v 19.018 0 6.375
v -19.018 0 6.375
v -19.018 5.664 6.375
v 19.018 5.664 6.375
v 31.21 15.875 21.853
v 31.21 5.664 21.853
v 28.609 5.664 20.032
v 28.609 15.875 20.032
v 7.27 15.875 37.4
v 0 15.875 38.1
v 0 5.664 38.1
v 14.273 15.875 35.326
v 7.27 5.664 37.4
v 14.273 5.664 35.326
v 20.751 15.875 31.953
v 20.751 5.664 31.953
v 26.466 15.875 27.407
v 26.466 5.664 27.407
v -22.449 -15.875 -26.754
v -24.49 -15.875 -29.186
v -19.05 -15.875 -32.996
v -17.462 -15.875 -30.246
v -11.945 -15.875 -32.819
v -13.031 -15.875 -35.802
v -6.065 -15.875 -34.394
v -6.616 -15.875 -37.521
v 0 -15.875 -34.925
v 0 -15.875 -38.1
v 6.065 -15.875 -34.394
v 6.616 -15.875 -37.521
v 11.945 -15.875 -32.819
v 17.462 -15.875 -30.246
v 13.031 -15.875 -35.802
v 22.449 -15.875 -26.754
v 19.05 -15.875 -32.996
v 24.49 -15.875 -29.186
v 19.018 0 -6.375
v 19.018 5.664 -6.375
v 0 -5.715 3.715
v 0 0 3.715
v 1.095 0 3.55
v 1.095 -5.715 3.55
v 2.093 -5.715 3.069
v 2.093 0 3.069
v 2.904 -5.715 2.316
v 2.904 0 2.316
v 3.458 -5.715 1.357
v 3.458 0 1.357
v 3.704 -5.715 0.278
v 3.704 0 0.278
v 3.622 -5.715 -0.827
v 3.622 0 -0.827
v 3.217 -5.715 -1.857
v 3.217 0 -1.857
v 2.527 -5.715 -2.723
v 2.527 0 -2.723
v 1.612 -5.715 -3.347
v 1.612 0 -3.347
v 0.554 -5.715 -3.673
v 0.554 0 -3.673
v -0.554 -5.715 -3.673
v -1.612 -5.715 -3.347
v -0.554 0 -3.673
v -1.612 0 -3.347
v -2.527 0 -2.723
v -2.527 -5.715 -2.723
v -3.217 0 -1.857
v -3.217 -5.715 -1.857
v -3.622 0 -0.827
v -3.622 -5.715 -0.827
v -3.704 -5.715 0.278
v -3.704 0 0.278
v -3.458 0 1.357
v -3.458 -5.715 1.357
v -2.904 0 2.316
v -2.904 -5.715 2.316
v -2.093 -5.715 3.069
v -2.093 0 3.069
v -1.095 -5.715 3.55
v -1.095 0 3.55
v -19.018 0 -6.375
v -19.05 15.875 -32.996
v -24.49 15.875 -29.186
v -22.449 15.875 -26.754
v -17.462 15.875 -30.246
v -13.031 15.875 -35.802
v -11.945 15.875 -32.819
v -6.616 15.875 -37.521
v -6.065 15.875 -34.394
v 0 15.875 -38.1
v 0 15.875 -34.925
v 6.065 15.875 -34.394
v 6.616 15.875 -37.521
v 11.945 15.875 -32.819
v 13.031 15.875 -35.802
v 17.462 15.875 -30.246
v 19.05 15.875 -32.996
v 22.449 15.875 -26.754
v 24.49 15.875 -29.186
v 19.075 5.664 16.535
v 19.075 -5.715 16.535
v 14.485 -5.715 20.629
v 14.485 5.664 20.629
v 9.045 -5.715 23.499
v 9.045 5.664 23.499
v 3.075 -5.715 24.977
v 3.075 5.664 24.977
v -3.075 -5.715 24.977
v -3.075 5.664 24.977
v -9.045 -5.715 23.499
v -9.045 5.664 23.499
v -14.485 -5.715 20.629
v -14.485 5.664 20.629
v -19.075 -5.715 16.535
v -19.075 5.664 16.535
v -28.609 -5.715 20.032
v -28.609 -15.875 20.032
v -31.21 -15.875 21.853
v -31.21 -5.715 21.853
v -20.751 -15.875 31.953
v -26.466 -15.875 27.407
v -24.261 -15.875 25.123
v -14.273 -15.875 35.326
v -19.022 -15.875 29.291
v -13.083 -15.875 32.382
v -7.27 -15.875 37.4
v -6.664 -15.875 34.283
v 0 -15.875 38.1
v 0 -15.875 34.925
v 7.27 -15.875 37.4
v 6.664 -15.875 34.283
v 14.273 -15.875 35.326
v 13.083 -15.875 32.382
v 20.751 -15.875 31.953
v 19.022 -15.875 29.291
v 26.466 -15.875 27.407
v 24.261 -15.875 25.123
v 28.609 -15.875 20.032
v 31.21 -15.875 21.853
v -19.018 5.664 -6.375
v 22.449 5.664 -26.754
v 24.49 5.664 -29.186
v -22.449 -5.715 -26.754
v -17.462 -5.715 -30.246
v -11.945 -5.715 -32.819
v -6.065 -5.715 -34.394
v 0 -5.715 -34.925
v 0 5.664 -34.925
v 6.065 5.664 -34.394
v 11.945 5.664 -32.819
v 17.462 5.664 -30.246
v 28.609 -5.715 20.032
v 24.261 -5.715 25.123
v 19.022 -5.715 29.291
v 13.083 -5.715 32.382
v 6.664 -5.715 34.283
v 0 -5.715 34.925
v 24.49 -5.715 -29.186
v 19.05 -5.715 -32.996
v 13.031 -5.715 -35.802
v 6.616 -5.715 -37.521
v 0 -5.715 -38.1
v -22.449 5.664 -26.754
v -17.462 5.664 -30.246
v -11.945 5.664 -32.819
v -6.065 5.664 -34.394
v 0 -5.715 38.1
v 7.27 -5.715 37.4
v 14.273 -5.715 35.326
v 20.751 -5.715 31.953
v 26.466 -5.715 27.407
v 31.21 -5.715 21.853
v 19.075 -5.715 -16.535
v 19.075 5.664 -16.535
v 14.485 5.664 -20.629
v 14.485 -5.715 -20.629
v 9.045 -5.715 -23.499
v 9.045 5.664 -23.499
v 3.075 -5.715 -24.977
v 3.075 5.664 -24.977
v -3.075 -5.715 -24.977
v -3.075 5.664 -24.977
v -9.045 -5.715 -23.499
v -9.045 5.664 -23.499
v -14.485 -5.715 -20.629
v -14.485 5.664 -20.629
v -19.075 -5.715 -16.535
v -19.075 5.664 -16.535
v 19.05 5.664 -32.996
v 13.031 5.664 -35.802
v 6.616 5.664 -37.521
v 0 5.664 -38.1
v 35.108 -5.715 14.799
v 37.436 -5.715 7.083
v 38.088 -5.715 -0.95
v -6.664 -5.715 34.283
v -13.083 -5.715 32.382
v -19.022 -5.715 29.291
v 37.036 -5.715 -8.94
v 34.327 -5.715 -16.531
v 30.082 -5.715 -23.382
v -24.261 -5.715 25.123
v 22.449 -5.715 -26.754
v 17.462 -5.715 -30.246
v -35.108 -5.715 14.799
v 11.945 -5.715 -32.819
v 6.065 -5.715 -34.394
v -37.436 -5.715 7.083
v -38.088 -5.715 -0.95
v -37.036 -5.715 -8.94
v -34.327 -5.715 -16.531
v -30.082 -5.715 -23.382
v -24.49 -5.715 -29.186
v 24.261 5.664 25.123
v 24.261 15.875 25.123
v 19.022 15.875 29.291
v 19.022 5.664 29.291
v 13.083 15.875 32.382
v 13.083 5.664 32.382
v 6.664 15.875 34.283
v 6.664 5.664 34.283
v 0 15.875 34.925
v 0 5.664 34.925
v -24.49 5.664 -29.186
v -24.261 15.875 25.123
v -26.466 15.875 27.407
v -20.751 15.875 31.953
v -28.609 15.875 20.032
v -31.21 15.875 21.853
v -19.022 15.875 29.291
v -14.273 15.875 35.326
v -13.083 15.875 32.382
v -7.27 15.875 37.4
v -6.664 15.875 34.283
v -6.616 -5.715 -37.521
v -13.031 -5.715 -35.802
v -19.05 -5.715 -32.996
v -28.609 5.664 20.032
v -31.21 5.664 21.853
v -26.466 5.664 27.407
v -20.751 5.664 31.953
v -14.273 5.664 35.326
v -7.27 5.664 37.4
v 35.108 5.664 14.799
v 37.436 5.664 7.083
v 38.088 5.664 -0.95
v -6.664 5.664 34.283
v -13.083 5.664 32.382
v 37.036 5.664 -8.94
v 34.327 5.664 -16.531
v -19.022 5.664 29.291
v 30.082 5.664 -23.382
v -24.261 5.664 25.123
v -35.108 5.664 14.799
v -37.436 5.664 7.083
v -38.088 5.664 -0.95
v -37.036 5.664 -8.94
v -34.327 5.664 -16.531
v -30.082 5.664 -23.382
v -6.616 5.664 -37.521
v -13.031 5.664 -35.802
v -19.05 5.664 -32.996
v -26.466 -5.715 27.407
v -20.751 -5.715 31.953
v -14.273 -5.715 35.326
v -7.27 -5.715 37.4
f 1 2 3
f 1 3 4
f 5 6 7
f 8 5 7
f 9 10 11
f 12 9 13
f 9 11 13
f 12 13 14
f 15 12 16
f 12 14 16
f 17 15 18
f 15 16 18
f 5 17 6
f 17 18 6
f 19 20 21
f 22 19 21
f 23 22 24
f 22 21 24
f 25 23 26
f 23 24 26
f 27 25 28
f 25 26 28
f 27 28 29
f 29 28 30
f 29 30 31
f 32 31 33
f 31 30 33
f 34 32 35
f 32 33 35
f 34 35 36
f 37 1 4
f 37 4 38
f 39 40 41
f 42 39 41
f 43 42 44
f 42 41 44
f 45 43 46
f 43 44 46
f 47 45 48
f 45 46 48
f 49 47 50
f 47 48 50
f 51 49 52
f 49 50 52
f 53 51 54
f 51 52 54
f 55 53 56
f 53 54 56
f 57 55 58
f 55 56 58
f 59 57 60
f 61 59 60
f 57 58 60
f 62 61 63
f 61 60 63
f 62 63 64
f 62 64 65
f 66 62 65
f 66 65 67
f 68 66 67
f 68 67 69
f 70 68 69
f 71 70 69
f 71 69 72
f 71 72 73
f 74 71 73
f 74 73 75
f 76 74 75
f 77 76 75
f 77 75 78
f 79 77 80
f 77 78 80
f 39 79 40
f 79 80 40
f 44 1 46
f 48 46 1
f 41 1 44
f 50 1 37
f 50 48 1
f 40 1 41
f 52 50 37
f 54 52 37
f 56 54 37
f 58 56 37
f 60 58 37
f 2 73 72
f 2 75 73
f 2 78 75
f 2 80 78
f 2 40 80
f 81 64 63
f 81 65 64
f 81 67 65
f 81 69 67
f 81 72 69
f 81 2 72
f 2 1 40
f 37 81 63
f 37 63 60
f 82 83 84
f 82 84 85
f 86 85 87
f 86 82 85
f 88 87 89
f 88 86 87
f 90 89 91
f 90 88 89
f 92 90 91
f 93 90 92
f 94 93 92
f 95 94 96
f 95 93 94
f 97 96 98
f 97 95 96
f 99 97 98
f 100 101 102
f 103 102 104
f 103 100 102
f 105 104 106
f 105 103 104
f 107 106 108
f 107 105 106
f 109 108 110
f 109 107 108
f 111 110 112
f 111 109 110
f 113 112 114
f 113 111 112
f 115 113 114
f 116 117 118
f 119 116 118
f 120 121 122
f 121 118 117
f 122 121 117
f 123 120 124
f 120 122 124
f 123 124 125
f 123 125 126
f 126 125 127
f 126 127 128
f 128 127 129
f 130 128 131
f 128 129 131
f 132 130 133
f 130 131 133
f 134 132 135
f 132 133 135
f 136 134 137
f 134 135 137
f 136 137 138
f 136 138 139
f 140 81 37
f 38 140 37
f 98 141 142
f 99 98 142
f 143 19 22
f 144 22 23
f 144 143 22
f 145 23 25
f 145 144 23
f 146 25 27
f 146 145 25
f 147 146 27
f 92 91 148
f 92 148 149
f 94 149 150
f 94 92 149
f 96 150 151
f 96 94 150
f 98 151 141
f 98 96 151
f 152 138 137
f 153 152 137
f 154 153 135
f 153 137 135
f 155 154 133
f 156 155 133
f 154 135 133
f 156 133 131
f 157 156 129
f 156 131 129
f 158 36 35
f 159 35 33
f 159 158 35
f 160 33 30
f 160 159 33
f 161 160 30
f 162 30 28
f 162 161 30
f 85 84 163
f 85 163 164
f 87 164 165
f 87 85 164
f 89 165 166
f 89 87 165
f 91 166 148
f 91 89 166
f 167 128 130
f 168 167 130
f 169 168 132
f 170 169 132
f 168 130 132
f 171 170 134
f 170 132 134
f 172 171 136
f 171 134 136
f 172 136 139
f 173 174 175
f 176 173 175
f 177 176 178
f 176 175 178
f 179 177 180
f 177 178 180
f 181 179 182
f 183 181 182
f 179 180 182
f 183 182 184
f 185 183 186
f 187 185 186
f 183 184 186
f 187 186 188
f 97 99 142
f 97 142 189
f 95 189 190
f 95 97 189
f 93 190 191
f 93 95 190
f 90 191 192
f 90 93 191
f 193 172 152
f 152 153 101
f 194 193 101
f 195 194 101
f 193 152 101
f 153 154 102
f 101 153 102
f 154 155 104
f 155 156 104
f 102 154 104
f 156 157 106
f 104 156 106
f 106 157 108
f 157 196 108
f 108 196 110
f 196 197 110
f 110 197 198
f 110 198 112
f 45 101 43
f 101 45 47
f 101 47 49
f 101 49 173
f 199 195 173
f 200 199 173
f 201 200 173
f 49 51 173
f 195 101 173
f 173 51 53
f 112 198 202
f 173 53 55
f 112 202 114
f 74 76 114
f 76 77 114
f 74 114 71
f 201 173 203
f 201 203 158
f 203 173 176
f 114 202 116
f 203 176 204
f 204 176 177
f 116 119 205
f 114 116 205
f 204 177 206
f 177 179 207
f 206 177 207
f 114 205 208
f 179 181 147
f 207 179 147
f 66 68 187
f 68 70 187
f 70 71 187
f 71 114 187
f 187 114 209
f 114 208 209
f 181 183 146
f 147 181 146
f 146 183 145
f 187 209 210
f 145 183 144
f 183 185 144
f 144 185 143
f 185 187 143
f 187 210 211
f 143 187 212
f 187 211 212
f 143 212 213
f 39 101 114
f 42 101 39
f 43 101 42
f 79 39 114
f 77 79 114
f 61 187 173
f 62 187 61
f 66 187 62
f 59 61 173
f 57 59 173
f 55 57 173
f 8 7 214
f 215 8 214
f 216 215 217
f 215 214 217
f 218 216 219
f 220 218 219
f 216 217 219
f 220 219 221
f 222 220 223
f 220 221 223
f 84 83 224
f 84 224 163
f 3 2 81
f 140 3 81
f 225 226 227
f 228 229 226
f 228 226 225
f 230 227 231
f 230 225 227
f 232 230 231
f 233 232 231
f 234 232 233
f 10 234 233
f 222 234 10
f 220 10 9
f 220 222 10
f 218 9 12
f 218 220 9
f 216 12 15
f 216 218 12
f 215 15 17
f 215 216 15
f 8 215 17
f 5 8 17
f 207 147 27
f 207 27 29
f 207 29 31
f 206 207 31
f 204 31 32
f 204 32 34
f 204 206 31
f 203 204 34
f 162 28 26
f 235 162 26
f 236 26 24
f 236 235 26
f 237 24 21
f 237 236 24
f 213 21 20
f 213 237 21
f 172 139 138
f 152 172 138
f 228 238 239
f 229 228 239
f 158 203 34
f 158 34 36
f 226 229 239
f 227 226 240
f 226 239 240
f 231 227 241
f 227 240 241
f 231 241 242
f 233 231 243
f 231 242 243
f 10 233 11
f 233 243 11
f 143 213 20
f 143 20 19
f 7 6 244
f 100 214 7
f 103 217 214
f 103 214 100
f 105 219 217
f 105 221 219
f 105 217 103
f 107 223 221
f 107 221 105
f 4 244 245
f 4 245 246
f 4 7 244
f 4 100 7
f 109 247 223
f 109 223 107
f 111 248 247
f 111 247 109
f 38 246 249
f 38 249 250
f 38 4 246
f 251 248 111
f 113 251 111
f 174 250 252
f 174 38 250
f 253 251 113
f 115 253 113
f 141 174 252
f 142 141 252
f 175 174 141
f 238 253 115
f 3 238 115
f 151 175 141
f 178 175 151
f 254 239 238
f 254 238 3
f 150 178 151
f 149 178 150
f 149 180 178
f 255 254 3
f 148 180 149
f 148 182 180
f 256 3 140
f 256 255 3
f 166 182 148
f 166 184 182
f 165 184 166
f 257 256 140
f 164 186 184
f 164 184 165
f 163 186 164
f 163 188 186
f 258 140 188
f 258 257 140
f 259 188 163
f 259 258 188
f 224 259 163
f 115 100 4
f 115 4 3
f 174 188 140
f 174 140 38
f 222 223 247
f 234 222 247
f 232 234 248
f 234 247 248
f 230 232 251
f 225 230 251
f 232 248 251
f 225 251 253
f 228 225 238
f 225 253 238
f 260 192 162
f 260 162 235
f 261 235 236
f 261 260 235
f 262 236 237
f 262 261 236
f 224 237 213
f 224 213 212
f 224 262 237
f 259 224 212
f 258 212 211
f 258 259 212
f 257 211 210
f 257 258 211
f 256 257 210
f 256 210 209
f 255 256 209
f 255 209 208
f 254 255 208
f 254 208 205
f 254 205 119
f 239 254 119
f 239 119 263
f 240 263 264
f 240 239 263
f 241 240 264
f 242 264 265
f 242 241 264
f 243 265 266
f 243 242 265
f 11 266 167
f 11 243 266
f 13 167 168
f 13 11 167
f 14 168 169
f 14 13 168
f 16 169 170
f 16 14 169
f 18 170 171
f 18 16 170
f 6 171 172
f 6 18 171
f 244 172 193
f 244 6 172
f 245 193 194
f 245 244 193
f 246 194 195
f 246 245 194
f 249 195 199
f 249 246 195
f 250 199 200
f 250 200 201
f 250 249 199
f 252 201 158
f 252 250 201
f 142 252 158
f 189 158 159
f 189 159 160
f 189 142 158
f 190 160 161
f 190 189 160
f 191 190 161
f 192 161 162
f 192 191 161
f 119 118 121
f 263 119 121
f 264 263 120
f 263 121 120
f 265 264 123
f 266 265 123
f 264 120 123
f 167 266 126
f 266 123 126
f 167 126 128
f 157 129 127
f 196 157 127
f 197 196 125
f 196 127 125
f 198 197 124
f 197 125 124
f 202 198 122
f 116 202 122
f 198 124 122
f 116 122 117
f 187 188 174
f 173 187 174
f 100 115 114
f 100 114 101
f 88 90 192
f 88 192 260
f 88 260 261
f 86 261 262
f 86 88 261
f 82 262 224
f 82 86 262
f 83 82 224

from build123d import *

# Parameters (mm, degrees)
SKETCH1_R           = 38.1
SKETCH1_W           = 38.0365
SKETCH1_H           = 12.7508
BOSS_EXTRUDE1_DEPTH = 5.6642
BOSS_EXTRUDE2_START = -5.715
SKETCH1_3_R         = 38.1
SKETCH1_3_R_2       = 3.71475
BOSS_EXTRUDE2_DEPTH = 5.715
BOSS_EXTRUDE3_DEPTH = 15.875
CUT_EXTRUDE2_DEPTH  = 59.02721


with BuildPart() as part:
    # Sketch1 → Boss-Extrude1 (new body)
    with BuildSketch(Plane(origin=(0, 0, 0), x_dir=(1, 0, 0), z_dir=(0, 1, 0))):
        Circle(SKETCH1_R)
        Rectangle(SKETCH1_W, SKETCH1_H, mode=Mode.SUBTRACT)
    extrude(amount=BOSS_EXTRUDE1_DEPTH)

    # Sketch1<3> → Boss-Extrude2 (add)
    with BuildSketch(Plane(origin=(0, 0, 0), x_dir=(1, 0, 0), z_dir=(0, 1, 0)).offset(BOSS_EXTRUDE2_START)):
        Circle(SKETCH1_3_R)
        Circle(SKETCH1_3_R_2, mode=Mode.SUBTRACT)
    extrude(amount=BOSS_EXTRUDE2_DEPTH)

    # Sketch2 → Boss-Extrude3 (add, symmetric)
    with BuildSketch(Plane(origin=(0, 0, 0), x_dir=(1, 0, 0), z_dir=(0, 1, 0))):
        with BuildLine():
            ThreePointArc((24.490208, 29.186293), (0, 38.1), (-24.490208, 29.186293))
            Line((-24.490208, 29.186293), (-22.449357, 26.754102))
            ThreePointArc((-22.449357, 26.754102), (0, 34.925), (22.449357, 26.754102))
            Line((22.449357, 26.754102), (24.490208, 29.186293))
        make_face()
        with BuildLine():
            ThreePointArc((28.608885, -20.032157), (0, -34.925), (-28.608885, -20.032157))
            Line((-28.608885, -20.032157), (-31.209693, -21.853262))
            ThreePointArc((-31.209693, -21.853262), (0, -38.1), (31.209693, -21.853262))
            Line((31.209693, -21.853262), (28.608885, -20.032157))
        make_face()
    extrude(amount=BOSS_EXTRUDE3_DEPTH, both=True)

    # Sketch3 → Cut-Extrude2 (cut, through all)
    with BuildSketch(Plane(origin=(0, 5.6642, 0), x_dir=(1, 0, 0), z_dir=(0, 1, 0))):
        with BuildLine():
            Line((-19.0754, 16.5354), (19.0754, 16.5354))
            ThreePointArc((19.0754, 16.5354), (0, 25.163724), (-19.0754, 16.5354))
        make_face()
        with BuildLine():
            Line((-19.0754, -16.5354), (19.0754, -16.5354))
            ThreePointArc((19.0754, -16.5354), (0, -25.163724), (-19.0754, -16.5354))
        make_face()
    extrude(amount=-CUT_EXTRUDE2_DEPTH, mode=Mode.SUBTRACT)


solid = part.part
